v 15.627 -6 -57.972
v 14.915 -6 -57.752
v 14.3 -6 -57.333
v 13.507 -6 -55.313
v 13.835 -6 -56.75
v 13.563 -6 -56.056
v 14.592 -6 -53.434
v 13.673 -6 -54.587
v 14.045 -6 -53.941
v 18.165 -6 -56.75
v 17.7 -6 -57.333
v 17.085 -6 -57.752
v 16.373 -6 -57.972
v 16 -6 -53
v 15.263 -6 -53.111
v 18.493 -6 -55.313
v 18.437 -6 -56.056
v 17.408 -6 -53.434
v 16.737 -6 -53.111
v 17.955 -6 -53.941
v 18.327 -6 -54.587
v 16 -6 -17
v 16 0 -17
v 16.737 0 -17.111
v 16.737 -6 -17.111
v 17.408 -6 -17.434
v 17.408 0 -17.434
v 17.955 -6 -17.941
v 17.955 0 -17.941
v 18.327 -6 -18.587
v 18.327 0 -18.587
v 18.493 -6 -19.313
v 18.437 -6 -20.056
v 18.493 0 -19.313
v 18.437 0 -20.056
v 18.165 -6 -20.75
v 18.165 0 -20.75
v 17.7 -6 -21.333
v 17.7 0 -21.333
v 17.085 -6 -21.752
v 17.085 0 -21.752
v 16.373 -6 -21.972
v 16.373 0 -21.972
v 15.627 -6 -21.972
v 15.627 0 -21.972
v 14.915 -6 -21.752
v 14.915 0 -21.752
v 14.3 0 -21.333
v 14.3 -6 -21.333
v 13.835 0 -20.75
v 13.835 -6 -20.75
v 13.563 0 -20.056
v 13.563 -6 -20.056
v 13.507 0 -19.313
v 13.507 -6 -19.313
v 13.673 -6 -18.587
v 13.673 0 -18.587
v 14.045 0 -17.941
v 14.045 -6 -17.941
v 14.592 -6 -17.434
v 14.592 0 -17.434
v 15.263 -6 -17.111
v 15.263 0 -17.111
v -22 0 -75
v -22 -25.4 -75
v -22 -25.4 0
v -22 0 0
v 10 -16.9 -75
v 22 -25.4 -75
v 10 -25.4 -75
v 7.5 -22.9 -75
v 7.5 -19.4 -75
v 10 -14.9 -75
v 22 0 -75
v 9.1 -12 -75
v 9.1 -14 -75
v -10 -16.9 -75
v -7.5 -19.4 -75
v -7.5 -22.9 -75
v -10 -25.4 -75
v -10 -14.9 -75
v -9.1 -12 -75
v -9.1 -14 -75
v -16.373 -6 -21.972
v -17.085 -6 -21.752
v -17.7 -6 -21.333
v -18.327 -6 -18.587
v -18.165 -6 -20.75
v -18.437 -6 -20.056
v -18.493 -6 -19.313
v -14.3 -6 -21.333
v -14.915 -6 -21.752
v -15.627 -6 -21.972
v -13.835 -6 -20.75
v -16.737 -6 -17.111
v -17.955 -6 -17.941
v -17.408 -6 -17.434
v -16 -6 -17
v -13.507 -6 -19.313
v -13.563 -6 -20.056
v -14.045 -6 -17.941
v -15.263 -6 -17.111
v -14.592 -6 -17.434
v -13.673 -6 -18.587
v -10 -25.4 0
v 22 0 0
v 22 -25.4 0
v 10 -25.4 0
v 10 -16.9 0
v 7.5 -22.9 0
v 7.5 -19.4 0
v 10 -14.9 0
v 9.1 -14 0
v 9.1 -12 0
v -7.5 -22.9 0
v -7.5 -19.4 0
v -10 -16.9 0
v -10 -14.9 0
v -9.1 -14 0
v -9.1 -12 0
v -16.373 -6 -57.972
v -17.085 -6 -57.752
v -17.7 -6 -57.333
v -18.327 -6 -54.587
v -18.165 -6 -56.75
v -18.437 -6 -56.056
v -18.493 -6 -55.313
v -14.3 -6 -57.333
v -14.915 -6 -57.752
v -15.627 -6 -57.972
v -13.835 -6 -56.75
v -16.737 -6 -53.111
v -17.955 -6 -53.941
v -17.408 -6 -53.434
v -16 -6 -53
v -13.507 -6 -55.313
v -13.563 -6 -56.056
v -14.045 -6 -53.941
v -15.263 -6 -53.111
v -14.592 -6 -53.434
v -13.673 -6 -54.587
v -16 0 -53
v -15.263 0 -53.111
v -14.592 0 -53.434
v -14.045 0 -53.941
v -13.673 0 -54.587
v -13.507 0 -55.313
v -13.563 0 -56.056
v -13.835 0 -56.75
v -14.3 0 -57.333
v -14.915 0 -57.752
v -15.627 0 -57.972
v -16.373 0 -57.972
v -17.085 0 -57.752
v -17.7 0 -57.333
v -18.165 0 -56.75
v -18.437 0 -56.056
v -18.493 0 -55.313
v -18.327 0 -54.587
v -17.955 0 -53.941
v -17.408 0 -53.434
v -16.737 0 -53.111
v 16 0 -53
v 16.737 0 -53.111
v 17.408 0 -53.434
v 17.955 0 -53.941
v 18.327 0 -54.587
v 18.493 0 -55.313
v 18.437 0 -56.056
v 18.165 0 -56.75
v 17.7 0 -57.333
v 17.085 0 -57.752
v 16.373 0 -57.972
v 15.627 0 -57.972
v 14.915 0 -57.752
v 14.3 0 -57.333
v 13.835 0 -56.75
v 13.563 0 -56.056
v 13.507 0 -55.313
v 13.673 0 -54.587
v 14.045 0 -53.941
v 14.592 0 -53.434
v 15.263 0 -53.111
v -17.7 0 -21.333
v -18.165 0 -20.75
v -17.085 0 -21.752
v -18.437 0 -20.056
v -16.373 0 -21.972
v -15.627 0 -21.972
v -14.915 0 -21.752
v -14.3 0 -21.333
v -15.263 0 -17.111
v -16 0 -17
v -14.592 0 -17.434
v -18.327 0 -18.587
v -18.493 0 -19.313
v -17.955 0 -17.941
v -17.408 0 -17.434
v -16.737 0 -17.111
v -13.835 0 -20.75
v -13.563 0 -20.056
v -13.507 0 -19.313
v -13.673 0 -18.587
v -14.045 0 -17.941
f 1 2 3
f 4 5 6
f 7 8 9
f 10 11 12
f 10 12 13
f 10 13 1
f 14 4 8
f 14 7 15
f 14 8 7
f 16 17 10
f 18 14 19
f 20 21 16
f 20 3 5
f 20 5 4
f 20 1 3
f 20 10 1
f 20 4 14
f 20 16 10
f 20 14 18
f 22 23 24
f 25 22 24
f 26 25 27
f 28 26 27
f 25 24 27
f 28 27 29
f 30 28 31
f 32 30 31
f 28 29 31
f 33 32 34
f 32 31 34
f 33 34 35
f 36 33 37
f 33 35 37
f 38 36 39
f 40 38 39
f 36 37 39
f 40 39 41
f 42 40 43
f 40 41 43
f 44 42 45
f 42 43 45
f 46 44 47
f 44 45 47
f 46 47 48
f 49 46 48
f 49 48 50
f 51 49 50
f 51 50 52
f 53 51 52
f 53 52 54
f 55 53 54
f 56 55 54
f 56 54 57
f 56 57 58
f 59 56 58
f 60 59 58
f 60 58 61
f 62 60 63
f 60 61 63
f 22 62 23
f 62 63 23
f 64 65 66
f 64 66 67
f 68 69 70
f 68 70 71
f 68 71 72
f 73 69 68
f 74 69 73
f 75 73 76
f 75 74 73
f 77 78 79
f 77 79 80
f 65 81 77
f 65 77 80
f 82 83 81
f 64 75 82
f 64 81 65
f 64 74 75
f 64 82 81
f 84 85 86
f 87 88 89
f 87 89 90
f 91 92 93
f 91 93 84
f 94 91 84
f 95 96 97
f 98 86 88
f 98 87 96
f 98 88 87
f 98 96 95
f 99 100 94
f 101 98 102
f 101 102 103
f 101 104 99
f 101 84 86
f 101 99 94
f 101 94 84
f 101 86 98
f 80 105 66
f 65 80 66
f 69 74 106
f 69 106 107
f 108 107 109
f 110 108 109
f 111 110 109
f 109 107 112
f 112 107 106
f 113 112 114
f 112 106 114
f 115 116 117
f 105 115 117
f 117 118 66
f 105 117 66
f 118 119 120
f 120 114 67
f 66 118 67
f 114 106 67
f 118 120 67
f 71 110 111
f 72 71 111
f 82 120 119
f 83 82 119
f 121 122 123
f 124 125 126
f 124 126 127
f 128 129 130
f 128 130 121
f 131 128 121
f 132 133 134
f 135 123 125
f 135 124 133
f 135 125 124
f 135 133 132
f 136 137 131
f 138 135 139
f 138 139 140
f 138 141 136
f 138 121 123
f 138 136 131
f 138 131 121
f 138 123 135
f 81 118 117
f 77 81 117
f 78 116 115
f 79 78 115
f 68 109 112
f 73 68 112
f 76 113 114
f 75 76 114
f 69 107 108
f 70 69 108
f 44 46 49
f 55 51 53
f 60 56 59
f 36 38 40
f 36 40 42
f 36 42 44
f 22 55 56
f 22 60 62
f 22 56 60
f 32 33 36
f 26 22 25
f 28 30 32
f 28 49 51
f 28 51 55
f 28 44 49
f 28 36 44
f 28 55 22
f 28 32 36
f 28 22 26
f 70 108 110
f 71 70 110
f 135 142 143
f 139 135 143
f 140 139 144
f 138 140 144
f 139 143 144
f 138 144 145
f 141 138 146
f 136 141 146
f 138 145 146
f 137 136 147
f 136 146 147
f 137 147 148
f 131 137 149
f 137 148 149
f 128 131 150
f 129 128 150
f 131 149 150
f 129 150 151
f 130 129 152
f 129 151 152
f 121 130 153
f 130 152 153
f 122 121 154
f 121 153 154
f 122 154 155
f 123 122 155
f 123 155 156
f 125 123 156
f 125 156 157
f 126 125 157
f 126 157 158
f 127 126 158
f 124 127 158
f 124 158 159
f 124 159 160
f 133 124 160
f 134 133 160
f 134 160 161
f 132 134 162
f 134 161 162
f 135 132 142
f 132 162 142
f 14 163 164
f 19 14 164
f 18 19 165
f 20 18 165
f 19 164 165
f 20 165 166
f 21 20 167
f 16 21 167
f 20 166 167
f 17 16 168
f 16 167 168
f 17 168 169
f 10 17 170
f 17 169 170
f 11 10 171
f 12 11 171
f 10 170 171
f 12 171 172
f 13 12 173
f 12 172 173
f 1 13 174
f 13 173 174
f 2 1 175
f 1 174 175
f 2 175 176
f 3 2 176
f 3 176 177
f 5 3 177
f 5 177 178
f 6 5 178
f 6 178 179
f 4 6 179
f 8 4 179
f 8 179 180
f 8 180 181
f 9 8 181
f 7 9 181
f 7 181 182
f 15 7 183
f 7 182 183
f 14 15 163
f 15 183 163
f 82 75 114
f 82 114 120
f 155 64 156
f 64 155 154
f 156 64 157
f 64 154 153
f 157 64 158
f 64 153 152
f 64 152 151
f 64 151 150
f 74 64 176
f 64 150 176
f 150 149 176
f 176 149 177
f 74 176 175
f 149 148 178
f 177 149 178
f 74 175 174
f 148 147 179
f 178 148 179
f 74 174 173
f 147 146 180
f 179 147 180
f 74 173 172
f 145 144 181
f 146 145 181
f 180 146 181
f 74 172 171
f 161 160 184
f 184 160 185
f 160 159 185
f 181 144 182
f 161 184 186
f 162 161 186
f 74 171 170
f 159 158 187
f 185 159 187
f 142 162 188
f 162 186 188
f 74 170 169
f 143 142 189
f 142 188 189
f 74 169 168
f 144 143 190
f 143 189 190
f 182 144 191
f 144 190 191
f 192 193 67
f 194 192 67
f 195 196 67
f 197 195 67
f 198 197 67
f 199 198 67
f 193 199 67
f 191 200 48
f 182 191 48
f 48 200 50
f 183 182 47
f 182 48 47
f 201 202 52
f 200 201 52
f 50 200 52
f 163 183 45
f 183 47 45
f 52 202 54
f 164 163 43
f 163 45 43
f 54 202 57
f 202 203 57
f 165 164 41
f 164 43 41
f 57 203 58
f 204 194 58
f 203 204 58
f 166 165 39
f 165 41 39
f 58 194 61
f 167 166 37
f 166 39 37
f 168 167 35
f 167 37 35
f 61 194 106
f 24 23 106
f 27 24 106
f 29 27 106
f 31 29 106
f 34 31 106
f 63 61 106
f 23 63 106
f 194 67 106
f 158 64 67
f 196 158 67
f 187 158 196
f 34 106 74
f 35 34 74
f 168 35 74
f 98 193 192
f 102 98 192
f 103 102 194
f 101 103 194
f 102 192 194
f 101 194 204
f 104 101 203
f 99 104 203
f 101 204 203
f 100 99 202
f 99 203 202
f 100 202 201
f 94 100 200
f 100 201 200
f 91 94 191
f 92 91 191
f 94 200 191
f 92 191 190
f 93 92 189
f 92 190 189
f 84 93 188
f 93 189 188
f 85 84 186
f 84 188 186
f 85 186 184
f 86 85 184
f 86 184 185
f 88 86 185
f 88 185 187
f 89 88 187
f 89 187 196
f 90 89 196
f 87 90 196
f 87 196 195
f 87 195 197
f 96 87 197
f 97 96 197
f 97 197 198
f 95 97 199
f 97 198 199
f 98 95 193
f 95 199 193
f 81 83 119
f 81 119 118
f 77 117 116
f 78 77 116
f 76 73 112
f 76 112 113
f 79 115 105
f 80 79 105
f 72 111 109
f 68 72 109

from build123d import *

# Parameters (mm, degrees)
BOSS_EXTRUDE1_DEPTH = 75
SKETCH2_R           = 2.5
CUT_EXTRUDE1_DEPTH  = 6


with BuildPart() as part:
    # Sketch1 → Boss-Extrude1 (new body)
    with BuildSketch(Plane.XY):
        Polygon((-22, 0), (22, 0), (22, -25.4), (10, -25.4), (7.5, -22.9), (7.5, -19.4), (10, -16.9), (10, -14.9), (9.1, -14), (9.1, -12), (-9.1, -12), (-9.1, -14), (-10, -14.9), (-10, -16.9), (-7.5, -19.4), (-7.5, -22.9), (-10, -25.4), (-22, -25.4), align=None)
    extrude(amount=-BOSS_EXTRUDE1_DEPTH)

    # Sketch2 → Cut-Extrude1 (cut)
    with BuildSketch(Plane(origin=(0, 0, 0), x_dir=(1, 0, 0), z_dir=(0, 1, 0))):
        with Locations(Location((-16, 55.5, 0), (0, 0, 270))):
            Circle(SKETCH2_R)
        with Locations(Location((-16, 19.5, 0), (0, 0, 270))):
            Circle(SKETCH2_R)
        with Locations(Location((16, 55.5, 0), (0, 0, 270))):
            Circle(SKETCH2_R)
        with Locations(Location((16, 19.5, 0), (0, 0, 270))):
            Circle(SKETCH2_R)
    extrude(amount=-CUT_EXTRUDE1_DEPTH, mode=Mode.SUBTRACT)


solid = part.part
